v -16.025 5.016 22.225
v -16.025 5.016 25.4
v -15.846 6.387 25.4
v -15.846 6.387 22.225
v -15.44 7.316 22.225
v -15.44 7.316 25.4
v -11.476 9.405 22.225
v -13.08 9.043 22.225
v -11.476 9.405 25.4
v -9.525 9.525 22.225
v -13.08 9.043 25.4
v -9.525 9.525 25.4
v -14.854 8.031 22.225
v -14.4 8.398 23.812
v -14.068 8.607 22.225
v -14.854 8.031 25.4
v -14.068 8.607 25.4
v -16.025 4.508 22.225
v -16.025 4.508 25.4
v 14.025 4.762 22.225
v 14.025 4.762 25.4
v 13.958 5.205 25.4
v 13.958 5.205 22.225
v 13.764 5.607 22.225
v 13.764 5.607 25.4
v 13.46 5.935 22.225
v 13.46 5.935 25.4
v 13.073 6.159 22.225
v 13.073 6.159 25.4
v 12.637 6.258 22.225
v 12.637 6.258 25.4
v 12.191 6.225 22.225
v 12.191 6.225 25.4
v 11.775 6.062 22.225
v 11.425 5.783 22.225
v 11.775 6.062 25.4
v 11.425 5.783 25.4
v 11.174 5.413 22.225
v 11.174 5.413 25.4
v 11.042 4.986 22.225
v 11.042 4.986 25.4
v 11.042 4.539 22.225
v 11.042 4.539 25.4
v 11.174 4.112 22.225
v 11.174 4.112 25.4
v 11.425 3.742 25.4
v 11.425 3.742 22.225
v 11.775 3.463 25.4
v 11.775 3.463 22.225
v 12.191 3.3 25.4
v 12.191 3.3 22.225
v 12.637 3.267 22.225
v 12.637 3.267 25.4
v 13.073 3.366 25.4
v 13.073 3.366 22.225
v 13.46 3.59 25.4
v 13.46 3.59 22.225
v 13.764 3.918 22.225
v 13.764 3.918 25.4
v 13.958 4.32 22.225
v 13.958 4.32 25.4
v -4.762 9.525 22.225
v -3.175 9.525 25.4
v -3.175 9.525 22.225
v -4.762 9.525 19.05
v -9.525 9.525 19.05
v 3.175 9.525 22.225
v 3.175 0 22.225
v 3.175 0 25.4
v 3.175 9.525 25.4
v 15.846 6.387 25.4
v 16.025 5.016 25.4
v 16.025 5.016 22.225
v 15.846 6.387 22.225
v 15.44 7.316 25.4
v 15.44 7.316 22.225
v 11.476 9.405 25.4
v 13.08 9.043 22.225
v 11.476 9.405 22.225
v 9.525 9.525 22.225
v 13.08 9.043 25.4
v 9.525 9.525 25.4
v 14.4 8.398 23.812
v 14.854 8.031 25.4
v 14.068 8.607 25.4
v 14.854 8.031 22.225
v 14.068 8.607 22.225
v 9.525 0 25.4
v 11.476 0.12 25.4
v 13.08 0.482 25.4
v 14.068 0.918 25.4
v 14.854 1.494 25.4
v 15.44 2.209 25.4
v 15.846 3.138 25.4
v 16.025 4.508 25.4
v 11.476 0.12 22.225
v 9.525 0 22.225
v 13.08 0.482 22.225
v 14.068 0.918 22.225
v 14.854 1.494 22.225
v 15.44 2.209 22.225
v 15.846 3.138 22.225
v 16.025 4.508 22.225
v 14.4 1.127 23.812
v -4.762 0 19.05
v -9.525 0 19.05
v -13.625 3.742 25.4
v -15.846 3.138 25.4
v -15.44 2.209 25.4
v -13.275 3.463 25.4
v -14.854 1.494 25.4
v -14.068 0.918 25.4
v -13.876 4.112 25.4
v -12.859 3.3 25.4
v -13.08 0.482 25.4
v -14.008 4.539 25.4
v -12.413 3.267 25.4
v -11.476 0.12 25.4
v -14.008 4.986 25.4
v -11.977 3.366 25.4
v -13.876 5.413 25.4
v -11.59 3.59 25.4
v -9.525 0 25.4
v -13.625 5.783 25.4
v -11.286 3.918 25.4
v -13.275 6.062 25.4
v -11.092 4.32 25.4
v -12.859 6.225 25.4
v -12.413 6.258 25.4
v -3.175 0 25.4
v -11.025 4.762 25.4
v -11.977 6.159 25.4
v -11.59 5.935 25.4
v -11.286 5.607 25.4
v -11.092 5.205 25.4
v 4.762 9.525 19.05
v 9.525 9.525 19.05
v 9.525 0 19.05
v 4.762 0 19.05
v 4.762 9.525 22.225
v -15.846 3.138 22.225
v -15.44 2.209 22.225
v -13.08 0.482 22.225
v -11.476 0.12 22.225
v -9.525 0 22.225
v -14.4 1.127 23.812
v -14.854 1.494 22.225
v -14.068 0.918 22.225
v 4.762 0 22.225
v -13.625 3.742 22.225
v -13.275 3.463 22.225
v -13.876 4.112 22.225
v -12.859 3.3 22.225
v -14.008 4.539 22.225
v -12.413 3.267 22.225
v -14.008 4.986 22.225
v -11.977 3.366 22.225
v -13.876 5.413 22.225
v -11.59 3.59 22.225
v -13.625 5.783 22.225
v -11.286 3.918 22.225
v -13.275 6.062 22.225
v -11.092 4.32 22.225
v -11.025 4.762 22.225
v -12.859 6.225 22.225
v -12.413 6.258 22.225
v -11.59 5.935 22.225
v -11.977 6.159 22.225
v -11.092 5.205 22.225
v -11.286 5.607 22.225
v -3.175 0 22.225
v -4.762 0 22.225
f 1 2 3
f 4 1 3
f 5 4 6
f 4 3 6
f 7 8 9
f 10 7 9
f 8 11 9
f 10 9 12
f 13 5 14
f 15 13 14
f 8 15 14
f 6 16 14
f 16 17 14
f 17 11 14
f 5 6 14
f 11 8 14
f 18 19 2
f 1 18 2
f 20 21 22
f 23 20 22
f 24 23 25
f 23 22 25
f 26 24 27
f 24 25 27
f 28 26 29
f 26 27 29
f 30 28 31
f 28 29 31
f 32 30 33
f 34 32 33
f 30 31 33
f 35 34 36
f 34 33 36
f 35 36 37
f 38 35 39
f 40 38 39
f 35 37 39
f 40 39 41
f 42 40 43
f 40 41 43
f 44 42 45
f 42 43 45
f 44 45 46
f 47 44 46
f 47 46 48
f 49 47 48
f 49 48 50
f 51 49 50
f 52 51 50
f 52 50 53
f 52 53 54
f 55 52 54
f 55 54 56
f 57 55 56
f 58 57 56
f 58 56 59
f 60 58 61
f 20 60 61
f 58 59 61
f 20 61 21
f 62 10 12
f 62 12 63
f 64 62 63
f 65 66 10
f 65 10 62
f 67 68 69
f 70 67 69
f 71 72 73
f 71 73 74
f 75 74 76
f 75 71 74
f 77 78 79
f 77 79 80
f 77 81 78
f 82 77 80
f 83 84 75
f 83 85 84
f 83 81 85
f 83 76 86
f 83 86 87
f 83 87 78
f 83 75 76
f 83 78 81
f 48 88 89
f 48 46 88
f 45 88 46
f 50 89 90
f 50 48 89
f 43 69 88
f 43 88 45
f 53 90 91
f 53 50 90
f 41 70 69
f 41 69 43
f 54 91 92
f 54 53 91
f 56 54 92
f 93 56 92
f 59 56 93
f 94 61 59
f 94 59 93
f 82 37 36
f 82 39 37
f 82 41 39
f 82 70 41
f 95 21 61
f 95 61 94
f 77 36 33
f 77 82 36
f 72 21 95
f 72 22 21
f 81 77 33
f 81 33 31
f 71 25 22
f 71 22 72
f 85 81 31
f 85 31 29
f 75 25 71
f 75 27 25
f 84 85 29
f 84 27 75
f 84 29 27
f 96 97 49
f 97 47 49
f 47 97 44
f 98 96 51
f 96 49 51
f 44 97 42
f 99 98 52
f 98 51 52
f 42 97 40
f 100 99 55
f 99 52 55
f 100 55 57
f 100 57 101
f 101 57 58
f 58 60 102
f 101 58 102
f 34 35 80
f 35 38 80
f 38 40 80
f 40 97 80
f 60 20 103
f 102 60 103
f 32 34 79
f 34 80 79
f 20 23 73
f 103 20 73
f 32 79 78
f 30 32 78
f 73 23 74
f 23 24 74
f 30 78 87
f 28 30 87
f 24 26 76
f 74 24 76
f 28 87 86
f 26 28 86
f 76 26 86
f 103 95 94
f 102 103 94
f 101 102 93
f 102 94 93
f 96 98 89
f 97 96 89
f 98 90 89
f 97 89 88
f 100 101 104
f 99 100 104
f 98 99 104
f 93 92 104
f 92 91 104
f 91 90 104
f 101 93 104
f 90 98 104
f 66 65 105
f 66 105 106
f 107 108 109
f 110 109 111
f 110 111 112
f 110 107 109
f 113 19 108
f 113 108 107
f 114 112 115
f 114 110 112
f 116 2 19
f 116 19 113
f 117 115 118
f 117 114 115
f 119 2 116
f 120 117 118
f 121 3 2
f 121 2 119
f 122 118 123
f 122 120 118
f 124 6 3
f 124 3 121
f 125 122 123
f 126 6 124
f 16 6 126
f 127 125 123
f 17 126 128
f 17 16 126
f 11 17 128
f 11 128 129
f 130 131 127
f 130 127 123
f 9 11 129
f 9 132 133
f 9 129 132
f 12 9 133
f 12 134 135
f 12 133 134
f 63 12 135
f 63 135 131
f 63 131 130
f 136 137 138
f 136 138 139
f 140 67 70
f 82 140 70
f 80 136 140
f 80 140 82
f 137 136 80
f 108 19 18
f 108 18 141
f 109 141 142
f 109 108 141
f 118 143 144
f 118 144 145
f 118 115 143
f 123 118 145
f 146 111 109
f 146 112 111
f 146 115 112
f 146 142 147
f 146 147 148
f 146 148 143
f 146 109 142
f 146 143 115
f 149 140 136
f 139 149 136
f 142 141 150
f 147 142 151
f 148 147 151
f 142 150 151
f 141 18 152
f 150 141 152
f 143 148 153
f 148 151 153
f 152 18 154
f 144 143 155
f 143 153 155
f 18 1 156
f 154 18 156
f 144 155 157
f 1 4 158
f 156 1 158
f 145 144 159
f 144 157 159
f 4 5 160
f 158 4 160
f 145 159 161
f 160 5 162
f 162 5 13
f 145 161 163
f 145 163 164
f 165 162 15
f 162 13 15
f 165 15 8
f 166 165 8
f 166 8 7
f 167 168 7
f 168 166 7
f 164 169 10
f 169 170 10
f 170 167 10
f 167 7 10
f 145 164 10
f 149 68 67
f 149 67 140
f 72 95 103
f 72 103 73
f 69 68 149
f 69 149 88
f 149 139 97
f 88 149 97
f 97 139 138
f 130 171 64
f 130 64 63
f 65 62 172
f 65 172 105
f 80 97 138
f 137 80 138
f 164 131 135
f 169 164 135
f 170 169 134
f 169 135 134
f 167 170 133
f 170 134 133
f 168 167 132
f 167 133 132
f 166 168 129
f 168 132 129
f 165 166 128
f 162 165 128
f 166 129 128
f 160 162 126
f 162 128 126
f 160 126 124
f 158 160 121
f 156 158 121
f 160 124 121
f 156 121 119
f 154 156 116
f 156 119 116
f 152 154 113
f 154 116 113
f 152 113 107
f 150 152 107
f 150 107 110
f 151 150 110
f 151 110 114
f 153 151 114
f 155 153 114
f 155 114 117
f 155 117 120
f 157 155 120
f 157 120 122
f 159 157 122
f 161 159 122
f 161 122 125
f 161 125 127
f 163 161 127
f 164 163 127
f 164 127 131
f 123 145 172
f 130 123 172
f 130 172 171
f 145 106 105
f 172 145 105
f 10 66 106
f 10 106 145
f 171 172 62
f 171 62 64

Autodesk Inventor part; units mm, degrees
ref_plane "Work Plane6" through (0, 9.525, 0) normal (0, 1, 0) x (1, 0, 0)
sketch "Sketch6" plane through (0, 9.525, 0) normal (0, 1, 0) x (1, 0, 0)
  line L0 (9.525, -19.05) -> (-9.525, -19.05)
  line L1 (-9.525, -19.05) -> (-9.525, -25.4)
  line L2 (9.525, -25.4) -> (9.525, -19.05)
  line L3 (3.175, -22.225) -> (4.7625, -22.225)
  line L4 (-4.7625, 25.4) -> (4.7625, 25.4) projected
  line L5 (4.7625, 22.225) -> (4.7625, 25.4) projected
  line L6 (-4.7625, -22.225) -> (-3.175, -22.225)
  line L7 (-3.175, -22.225) -> (-3.175, -25.4)
  line L8 (-4.7625, -22.225) -> (-4.7625, -19.05)
  line L9 (4.7625, -22.225) -> (4.7625, -19.05)
  line L10 (3.175, -22.225) -> (3.175, -25.4)
  line L11 (-9.525, -25.4) -> (-3.175, -25.4)
  line L12 (3.175, -25.4) -> (9.525, -25.4)
  point P0 (0, 0)
extrude "Extrusion6" add sketch "Sketch6" against normal blind 9.525
ref_plane "Work Plane7" through (3.175, 9.525, 25.4) normal (0, 0, 1) x (1, 0, 0)
sketch "Sketch7" plane through (3.175, 9.525, 25.4) normal (0, 0, 1) x (1, 0, 0)
  circle A0 centre (9.35, -4.7625) radius 1.5
  line L0 (12.85, -5.0165) -> (12.85, -4.5085)
  line L1 (12.85, -4.5085) -> (12.85, 0) construction
  line L2 (12.85, 0) -> (6.35, 0) construction
  spline S0 degree 2 poles (12.85, -4.5085) (12.85, 0) (6.35, 0) knots 1 1 1 2 2 2
  line L3 (12.85, -5.0165) -> (12.85, -9.525) construction
  line L4 (12.85, -9.525) -> (6.35, -9.525) construction
  spline S1 degree 2 poles (12.85, -5.0165) (12.85, -9.525) (6.35, -9.525) knots 1 1 1 2 2 2
  line L5 (-3.175, -9.525) -> (-3.175, 0)
  line L6 (-7.9375, 0) -> (1.5875, 0) projected
  line L7 (6.35, 0) -> (6.35, -9.525) projected
  line L8 (6.35, -9.525) -> (6.35, 0)
  circle A1 centre (-15.7, -4.7625) radius 1.5
  line L9 (-19.2, -5.0165) -> (-19.2, -4.5085)
  line L10 (-19.2, -4.5085) -> (-19.2, 0) construction
  line L11 (-19.2, 0) -> (-12.7, 0) construction
  spline S2 degree 2 poles (-19.2, -4.5085) (-19.2, 0) (-12.7, 0) knots 1 1 1 2 2 2
  line L12 (-19.2, -5.0165) -> (-19.2, -9.525) construction
  line L13 (-19.2, -9.525) -> (-12.7, -9.525) construction
  spline S3 degree 2 poles (-19.2, -5.0165) (-19.2, -9.525) (-12.7, -9.525) knots 1 1 1 2 2 2
  line L14 (-12.7, 0) -> (-12.7, -9.525)
  line L15 (-12.7, -9.525) -> (-12.7, 0)
  point P0 (10.85, -4.7625)
  point P1 (-17.2, -4.7625)
  dimension "d25" = 3
extrude "Extrusion7" add sketch "Sketch7" against normal blind 3.175
ref_plane "Work Plane5" through (-4.7625, 0, 3.175) normal (0, 0, 1) x (1, 0, 0)
ref_plane "Work Plane8" through (-9.525, 0, 22.225) normal (-1, 0, 0) x (0, 0, 1)
sketch "Sketch8" plane through (-9.525, 0, 22.225) normal (-1, 0, 0) x (0, 0, 1)
  point P0 (-22.225, 0)
properties part number "Connector_A"
